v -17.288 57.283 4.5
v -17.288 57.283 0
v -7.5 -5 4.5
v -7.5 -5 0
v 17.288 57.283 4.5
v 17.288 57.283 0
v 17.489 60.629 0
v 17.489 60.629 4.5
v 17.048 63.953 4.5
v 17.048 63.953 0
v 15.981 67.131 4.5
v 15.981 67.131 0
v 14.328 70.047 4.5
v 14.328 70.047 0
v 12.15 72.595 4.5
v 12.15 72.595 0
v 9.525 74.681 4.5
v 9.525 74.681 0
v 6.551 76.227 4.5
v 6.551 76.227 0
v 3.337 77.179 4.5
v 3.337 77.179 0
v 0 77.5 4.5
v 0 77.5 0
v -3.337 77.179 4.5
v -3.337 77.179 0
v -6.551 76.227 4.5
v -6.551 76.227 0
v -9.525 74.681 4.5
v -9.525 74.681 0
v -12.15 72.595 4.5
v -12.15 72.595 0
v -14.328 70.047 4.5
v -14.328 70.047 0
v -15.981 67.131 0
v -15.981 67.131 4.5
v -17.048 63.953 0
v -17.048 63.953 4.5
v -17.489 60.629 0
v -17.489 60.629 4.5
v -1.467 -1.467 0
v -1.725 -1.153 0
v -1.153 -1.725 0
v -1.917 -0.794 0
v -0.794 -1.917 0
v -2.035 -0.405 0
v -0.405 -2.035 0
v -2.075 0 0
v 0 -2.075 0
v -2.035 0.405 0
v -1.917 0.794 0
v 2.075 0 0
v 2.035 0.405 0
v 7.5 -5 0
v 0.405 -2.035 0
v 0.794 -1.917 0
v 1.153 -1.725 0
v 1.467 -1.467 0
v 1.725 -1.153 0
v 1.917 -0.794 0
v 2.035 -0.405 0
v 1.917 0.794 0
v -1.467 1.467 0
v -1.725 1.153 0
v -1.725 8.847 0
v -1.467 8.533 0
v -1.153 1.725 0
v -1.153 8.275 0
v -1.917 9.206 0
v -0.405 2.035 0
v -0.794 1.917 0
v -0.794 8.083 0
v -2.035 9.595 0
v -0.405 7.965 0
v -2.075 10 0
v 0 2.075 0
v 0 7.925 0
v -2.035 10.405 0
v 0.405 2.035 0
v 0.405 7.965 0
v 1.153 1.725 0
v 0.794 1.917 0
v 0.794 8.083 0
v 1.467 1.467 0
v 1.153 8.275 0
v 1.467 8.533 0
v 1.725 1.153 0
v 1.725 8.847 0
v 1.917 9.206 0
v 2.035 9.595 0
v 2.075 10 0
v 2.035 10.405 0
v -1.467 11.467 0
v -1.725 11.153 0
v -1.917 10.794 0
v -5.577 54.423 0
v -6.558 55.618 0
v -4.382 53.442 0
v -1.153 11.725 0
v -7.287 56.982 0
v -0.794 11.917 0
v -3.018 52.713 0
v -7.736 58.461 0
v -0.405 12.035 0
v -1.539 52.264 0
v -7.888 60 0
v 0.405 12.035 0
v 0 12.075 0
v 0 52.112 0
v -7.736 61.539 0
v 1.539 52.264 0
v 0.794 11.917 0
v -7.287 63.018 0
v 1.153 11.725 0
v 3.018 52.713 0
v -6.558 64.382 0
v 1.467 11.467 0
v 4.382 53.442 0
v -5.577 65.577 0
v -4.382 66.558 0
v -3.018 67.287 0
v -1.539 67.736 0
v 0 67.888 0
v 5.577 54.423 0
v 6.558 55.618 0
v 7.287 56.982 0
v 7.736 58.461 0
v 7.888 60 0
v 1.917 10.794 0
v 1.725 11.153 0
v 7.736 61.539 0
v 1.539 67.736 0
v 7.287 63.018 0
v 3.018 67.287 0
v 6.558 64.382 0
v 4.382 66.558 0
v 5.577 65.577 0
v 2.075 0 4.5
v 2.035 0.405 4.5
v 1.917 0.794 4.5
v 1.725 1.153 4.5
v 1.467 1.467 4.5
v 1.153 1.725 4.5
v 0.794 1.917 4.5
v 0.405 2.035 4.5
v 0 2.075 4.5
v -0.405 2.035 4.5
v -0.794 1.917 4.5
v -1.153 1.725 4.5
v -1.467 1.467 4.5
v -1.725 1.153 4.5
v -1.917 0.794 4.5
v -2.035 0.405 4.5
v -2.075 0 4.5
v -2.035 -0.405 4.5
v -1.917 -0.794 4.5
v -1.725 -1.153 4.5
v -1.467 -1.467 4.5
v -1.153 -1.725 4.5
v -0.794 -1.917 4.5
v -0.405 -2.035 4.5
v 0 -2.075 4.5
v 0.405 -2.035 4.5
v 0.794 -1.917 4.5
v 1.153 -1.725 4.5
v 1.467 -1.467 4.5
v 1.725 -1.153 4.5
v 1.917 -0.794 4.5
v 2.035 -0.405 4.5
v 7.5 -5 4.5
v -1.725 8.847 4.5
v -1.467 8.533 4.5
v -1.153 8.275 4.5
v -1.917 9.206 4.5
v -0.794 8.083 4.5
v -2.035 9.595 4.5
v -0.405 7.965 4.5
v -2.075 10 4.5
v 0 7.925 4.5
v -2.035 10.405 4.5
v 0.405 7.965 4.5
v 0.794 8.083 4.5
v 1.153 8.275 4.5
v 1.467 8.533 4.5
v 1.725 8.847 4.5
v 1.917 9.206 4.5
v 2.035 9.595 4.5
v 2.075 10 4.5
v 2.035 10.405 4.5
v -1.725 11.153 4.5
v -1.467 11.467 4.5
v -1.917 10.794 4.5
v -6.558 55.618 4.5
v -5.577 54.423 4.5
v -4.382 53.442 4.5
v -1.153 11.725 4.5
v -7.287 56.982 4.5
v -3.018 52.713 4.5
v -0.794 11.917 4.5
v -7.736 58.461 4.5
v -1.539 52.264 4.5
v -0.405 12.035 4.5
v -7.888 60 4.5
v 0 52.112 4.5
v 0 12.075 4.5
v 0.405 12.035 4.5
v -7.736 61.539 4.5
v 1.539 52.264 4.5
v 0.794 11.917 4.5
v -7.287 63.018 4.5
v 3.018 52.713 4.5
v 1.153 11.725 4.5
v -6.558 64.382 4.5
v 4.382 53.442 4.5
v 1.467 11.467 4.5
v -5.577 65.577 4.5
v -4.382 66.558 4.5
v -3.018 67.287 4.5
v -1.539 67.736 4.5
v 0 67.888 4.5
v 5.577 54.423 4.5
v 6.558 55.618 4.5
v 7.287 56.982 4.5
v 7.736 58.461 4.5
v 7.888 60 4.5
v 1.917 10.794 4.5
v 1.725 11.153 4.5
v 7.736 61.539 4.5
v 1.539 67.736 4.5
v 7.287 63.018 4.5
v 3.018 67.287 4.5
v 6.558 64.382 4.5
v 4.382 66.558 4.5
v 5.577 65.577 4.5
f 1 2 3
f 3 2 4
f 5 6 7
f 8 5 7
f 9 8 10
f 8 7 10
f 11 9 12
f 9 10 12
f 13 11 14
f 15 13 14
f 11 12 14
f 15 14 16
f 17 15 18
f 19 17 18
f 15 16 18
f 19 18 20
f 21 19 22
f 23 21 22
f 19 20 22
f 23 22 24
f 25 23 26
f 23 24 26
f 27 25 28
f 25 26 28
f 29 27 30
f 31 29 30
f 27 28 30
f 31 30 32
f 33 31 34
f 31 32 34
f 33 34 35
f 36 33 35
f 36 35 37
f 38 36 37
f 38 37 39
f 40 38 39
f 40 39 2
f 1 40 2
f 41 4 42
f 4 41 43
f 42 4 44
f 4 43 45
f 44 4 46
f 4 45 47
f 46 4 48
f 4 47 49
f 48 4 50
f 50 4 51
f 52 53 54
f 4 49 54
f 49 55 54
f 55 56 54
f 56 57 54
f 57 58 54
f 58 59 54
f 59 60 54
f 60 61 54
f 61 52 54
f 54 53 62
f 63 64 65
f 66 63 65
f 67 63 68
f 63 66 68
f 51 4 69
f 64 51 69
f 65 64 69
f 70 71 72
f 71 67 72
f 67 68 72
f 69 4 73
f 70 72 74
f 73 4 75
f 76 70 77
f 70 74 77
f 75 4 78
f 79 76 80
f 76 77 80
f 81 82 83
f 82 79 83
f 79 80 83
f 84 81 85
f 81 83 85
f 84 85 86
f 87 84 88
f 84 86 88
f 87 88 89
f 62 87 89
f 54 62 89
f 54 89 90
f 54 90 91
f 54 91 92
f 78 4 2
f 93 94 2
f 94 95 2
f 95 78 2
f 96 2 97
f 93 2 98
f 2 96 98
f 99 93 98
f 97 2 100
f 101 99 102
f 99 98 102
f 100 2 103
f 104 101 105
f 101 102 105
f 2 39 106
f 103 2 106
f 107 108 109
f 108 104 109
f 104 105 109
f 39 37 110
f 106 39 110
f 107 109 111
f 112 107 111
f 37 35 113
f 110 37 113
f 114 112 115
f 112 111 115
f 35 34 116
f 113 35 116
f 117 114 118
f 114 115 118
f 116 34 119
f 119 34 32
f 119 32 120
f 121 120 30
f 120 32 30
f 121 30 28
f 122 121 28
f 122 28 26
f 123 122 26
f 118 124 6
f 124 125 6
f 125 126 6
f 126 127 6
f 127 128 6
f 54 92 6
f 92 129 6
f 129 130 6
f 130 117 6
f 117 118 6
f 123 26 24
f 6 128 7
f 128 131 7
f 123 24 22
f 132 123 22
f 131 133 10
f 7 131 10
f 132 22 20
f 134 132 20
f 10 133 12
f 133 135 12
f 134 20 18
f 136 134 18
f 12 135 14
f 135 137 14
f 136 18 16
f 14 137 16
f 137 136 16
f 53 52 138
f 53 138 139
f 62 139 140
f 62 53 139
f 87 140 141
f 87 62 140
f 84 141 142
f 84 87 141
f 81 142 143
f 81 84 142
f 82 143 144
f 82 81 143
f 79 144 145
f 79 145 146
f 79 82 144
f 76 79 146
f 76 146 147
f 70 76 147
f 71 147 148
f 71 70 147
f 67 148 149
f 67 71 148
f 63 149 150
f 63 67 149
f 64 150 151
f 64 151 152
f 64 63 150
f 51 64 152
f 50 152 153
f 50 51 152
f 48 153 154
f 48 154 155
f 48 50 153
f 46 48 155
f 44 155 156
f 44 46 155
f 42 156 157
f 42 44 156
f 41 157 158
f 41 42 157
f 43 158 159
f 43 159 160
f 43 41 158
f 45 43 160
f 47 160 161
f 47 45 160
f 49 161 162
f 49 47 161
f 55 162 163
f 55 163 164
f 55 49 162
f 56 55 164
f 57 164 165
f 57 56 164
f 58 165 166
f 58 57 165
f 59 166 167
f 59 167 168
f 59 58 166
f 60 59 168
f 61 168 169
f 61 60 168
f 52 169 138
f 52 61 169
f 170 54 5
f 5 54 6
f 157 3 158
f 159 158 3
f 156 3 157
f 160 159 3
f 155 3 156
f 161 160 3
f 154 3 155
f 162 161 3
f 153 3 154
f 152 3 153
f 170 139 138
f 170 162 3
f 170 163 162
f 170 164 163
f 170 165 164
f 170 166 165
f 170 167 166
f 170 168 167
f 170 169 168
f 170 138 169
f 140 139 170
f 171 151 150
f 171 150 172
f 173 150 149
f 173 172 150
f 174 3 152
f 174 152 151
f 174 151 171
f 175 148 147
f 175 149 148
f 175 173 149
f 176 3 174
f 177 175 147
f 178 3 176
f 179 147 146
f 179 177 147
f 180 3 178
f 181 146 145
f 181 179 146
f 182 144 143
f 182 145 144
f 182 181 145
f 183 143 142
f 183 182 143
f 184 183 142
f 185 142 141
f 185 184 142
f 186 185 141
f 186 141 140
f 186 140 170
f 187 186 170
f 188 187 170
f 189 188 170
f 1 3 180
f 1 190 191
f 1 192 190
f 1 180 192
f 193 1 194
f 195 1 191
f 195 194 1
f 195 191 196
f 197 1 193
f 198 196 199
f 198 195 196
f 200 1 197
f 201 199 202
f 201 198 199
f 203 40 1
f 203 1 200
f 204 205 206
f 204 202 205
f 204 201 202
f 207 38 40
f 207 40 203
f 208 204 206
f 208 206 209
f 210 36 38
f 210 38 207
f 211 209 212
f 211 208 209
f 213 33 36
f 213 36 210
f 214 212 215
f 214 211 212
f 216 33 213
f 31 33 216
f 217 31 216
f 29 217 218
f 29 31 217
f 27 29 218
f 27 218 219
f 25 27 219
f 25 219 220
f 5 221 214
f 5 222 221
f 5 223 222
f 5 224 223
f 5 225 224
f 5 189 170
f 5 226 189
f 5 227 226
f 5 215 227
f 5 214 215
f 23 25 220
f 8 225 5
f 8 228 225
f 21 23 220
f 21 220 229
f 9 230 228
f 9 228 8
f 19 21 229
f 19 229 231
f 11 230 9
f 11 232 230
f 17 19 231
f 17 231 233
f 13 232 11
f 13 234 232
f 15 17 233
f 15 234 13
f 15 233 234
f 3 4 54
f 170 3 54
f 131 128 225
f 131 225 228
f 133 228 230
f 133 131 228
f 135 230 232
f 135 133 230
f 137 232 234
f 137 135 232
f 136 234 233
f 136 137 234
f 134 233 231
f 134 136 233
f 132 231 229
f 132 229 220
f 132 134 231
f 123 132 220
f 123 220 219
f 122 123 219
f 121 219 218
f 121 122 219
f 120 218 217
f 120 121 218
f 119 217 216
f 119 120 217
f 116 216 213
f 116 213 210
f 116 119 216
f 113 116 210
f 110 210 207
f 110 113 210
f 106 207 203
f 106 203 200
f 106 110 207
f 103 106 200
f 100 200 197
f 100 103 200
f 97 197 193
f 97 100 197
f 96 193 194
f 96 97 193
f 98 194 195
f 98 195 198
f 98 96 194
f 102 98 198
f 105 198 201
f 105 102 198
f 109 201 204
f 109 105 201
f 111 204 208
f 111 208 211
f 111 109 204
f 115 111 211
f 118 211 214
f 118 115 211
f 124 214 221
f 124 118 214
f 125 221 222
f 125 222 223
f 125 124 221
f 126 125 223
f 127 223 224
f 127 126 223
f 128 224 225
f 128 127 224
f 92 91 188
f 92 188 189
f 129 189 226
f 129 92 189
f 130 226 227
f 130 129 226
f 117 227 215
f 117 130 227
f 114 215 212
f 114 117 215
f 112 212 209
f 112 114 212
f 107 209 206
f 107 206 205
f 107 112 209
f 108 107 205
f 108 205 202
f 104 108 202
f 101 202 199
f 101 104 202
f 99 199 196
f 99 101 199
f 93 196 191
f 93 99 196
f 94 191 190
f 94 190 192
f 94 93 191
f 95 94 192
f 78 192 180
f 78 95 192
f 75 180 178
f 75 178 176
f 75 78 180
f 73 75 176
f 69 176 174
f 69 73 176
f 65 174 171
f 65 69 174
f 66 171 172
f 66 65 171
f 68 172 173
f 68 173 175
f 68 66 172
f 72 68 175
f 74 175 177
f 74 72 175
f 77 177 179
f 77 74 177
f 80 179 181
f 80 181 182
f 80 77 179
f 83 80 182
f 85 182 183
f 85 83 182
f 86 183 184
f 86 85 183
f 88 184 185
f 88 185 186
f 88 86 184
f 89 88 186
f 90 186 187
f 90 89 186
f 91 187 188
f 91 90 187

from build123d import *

# Parameters (mm, degrees)
SKETCH1_R           = 2.075
SKETCH1_R_2         = 7.8875
BOSS_EXTRUDE2_DEPTH = 4.5


with BuildPart() as part:
    # Sketch1 → Boss-Extrude2 (new body)
    with BuildSketch(Plane.XY):
        with BuildLine():
            Line((-7.5, -5), (7.5, -5))
            Line((7.5, -5), (17.287829772, 57.283211128))
            ThreePointArc((17.287829772, 57.283211128), (0, 77.5), (-17.287829772, 57.283211128))
            Line((-17.287829772, 57.283211128), (-7.5, -5))
        make_face()
        Circle(SKETCH1_R, mode=Mode.SUBTRACT)
        with Locations((0, 60)):
            Circle(SKETCH1_R_2, mode=Mode.SUBTRACT)
        with Locations((0, 10)):
            Circle(SKETCH1_R, mode=Mode.SUBTRACT)
    extrude(amount=BOSS_EXTRUDE2_DEPTH)


solid = part.part
